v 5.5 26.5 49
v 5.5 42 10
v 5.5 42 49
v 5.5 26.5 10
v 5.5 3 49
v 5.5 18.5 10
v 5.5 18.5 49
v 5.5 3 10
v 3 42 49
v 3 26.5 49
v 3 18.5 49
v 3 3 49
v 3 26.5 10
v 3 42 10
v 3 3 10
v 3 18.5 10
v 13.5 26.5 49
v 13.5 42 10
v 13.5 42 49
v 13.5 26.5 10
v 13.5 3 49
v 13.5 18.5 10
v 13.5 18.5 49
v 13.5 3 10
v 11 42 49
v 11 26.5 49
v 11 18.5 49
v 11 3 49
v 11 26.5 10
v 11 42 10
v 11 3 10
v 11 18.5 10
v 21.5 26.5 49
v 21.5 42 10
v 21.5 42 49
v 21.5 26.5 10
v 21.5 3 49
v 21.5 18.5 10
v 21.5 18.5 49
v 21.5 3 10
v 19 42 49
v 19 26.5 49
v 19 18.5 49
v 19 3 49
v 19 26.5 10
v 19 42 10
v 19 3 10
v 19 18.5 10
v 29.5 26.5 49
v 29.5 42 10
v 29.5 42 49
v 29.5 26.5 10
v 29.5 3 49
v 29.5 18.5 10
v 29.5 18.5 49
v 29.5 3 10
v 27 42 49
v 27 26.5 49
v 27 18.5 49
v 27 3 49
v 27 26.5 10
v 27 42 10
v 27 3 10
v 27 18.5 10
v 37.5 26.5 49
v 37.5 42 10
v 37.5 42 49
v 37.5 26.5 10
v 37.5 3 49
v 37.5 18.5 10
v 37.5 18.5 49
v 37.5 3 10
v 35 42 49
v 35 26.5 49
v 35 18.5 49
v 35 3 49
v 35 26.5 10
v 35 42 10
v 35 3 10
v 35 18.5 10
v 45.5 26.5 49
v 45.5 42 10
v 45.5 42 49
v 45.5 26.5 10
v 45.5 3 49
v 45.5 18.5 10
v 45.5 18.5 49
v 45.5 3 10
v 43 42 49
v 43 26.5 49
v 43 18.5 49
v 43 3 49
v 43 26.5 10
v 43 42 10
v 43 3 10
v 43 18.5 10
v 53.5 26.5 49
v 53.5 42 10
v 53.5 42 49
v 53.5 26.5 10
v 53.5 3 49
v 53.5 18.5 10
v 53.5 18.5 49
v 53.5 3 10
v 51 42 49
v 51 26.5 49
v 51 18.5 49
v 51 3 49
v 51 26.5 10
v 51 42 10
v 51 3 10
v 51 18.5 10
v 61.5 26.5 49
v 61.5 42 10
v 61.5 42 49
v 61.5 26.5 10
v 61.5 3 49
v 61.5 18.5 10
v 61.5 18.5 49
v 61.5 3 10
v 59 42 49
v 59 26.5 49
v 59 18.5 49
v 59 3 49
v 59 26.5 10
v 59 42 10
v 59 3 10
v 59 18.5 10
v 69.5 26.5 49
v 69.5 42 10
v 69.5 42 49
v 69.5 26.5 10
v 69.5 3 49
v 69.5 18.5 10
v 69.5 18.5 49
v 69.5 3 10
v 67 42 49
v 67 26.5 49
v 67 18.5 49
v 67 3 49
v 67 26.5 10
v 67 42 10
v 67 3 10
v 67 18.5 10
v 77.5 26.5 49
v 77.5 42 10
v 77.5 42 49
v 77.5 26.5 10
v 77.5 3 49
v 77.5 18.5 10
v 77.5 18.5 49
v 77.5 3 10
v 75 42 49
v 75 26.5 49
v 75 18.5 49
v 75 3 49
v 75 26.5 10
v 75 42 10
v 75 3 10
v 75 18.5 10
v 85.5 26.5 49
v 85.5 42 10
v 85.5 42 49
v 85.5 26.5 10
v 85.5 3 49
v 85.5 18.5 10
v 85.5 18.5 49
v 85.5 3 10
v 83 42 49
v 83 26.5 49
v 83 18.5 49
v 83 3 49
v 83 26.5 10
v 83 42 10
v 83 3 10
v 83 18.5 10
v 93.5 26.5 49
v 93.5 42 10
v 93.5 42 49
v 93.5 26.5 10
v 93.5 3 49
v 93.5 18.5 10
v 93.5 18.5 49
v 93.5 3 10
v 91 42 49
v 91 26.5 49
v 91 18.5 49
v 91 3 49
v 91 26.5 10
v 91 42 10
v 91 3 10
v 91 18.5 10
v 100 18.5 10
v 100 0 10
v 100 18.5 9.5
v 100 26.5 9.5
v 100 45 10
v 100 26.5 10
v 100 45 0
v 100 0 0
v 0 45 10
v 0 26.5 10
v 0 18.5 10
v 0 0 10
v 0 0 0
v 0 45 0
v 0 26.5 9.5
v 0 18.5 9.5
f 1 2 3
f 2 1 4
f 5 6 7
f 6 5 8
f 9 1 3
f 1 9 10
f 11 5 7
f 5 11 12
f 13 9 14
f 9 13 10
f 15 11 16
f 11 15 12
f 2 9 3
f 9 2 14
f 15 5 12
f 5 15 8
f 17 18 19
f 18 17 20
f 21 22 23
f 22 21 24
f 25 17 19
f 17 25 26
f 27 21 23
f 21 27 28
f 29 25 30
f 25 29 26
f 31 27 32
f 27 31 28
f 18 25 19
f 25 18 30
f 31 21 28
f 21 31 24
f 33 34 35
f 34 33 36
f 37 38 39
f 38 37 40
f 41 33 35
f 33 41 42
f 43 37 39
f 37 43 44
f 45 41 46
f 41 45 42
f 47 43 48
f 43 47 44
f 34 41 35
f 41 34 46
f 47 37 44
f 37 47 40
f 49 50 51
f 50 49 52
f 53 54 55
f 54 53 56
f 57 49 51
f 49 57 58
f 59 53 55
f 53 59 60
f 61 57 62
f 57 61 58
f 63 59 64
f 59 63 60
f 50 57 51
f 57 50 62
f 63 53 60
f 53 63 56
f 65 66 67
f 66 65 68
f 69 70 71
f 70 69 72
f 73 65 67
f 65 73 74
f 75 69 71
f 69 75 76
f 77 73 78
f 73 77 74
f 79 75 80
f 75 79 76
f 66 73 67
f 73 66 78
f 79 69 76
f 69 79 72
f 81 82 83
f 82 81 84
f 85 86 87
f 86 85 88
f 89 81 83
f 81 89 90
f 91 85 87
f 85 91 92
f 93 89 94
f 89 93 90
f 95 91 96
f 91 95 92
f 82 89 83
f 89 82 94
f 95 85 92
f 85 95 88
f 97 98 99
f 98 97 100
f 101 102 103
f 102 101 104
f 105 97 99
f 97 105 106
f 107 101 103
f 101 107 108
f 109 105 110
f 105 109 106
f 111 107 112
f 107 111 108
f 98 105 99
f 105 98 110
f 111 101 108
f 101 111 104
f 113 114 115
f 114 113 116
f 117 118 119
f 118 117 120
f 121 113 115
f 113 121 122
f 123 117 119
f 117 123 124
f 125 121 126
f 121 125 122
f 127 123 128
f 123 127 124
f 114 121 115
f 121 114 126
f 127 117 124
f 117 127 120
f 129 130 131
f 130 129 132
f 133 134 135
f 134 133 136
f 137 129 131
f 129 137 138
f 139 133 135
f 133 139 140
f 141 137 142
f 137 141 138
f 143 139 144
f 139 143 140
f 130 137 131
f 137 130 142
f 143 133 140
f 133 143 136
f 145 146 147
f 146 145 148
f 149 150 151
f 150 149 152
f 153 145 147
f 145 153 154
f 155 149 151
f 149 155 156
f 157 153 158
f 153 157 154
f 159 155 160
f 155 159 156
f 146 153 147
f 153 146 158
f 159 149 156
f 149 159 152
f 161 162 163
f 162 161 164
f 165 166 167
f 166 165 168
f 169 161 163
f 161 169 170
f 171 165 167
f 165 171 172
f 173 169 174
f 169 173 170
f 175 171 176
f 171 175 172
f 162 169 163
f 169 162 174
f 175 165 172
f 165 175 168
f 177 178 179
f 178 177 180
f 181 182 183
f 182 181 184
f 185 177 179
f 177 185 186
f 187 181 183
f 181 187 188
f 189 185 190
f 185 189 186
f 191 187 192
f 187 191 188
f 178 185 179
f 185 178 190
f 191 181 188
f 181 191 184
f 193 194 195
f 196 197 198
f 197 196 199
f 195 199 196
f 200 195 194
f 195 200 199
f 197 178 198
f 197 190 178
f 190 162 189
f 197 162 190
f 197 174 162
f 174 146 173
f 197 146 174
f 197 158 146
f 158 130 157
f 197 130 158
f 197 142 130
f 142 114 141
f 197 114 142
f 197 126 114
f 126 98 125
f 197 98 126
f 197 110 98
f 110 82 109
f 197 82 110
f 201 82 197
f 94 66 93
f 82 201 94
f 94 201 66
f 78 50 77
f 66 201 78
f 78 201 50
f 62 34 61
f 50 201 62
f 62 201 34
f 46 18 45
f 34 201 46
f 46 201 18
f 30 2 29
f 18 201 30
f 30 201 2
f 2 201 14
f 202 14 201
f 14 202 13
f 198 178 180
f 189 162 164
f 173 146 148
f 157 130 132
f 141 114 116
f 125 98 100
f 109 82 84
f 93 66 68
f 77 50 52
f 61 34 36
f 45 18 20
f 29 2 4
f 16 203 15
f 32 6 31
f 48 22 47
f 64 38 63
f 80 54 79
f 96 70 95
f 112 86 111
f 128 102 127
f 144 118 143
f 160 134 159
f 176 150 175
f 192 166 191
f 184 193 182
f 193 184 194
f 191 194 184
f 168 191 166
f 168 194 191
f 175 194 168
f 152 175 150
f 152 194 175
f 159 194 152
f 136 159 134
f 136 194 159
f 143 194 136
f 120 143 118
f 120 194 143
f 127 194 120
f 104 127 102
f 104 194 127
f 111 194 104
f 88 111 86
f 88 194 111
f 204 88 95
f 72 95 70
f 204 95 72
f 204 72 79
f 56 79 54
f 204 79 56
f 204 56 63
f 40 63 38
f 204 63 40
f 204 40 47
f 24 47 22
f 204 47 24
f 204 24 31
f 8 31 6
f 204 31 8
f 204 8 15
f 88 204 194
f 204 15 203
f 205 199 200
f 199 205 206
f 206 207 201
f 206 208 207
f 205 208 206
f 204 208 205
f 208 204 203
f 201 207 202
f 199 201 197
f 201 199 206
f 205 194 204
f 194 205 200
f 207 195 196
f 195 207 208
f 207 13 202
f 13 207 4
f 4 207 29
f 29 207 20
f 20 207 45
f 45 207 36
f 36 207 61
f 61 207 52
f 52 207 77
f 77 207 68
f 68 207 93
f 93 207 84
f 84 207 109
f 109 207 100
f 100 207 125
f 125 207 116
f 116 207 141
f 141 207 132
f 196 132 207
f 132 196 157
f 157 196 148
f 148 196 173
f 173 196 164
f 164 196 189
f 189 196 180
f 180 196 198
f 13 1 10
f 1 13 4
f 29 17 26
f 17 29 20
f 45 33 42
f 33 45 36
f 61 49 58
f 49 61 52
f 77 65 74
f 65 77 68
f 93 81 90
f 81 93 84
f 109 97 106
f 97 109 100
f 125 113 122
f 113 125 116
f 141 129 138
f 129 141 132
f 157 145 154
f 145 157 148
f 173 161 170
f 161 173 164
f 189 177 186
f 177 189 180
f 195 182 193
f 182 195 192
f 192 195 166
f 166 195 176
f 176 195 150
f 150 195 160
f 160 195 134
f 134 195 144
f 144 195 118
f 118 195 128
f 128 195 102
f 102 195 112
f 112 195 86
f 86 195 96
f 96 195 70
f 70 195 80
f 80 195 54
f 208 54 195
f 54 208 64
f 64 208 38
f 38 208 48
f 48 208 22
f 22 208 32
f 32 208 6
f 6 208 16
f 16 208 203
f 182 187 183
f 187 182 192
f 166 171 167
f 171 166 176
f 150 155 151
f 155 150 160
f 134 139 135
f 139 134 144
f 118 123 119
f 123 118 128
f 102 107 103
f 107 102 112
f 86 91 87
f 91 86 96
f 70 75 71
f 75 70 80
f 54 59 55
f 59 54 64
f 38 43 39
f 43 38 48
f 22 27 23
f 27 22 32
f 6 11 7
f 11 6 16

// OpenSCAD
$fn = 32;

// ----------------------------------------------------------------------
// Heatsink: slotted fin block
// ----------------------------------------------------------------------

// --- parameters (mm) ---
base_l = 100;             // base length, X
base_w = 45;              // base width, Y
base_t = 10;              // base plate thickness
fin_h = 40;               // fin height above the base
fin_t = 2.5;              // fin thickness
edge = 3;                 // margin from the base ends
pitch = 8;                // fin pitch
slot_w = 8;               // central slot width, Y
fit_tol = 0.1;            // tolerance for press fits, mm
free_tol = 0.3;           // tolerance for clearance fits, mm

n_fins = floor((base_l - 2 * edge - fin_t) / pitch) + 1;  // fin count
total_h = base_t + fin_h - 1;  // overall height

difference() {
union() {
  cube([base_l, base_w, base_t]);
  for (i = [0 : n_fins - 1])
    translate([edge + i * pitch, edge, base_t - 1])
      cube([fin_t, base_w - 2 * edge, fin_h]);
}
  translate([-1, base_w / 2 - slot_w / 2, base_t - 0.5])
    cube([base_l + 2, slot_w, fin_h + 2]);
}
